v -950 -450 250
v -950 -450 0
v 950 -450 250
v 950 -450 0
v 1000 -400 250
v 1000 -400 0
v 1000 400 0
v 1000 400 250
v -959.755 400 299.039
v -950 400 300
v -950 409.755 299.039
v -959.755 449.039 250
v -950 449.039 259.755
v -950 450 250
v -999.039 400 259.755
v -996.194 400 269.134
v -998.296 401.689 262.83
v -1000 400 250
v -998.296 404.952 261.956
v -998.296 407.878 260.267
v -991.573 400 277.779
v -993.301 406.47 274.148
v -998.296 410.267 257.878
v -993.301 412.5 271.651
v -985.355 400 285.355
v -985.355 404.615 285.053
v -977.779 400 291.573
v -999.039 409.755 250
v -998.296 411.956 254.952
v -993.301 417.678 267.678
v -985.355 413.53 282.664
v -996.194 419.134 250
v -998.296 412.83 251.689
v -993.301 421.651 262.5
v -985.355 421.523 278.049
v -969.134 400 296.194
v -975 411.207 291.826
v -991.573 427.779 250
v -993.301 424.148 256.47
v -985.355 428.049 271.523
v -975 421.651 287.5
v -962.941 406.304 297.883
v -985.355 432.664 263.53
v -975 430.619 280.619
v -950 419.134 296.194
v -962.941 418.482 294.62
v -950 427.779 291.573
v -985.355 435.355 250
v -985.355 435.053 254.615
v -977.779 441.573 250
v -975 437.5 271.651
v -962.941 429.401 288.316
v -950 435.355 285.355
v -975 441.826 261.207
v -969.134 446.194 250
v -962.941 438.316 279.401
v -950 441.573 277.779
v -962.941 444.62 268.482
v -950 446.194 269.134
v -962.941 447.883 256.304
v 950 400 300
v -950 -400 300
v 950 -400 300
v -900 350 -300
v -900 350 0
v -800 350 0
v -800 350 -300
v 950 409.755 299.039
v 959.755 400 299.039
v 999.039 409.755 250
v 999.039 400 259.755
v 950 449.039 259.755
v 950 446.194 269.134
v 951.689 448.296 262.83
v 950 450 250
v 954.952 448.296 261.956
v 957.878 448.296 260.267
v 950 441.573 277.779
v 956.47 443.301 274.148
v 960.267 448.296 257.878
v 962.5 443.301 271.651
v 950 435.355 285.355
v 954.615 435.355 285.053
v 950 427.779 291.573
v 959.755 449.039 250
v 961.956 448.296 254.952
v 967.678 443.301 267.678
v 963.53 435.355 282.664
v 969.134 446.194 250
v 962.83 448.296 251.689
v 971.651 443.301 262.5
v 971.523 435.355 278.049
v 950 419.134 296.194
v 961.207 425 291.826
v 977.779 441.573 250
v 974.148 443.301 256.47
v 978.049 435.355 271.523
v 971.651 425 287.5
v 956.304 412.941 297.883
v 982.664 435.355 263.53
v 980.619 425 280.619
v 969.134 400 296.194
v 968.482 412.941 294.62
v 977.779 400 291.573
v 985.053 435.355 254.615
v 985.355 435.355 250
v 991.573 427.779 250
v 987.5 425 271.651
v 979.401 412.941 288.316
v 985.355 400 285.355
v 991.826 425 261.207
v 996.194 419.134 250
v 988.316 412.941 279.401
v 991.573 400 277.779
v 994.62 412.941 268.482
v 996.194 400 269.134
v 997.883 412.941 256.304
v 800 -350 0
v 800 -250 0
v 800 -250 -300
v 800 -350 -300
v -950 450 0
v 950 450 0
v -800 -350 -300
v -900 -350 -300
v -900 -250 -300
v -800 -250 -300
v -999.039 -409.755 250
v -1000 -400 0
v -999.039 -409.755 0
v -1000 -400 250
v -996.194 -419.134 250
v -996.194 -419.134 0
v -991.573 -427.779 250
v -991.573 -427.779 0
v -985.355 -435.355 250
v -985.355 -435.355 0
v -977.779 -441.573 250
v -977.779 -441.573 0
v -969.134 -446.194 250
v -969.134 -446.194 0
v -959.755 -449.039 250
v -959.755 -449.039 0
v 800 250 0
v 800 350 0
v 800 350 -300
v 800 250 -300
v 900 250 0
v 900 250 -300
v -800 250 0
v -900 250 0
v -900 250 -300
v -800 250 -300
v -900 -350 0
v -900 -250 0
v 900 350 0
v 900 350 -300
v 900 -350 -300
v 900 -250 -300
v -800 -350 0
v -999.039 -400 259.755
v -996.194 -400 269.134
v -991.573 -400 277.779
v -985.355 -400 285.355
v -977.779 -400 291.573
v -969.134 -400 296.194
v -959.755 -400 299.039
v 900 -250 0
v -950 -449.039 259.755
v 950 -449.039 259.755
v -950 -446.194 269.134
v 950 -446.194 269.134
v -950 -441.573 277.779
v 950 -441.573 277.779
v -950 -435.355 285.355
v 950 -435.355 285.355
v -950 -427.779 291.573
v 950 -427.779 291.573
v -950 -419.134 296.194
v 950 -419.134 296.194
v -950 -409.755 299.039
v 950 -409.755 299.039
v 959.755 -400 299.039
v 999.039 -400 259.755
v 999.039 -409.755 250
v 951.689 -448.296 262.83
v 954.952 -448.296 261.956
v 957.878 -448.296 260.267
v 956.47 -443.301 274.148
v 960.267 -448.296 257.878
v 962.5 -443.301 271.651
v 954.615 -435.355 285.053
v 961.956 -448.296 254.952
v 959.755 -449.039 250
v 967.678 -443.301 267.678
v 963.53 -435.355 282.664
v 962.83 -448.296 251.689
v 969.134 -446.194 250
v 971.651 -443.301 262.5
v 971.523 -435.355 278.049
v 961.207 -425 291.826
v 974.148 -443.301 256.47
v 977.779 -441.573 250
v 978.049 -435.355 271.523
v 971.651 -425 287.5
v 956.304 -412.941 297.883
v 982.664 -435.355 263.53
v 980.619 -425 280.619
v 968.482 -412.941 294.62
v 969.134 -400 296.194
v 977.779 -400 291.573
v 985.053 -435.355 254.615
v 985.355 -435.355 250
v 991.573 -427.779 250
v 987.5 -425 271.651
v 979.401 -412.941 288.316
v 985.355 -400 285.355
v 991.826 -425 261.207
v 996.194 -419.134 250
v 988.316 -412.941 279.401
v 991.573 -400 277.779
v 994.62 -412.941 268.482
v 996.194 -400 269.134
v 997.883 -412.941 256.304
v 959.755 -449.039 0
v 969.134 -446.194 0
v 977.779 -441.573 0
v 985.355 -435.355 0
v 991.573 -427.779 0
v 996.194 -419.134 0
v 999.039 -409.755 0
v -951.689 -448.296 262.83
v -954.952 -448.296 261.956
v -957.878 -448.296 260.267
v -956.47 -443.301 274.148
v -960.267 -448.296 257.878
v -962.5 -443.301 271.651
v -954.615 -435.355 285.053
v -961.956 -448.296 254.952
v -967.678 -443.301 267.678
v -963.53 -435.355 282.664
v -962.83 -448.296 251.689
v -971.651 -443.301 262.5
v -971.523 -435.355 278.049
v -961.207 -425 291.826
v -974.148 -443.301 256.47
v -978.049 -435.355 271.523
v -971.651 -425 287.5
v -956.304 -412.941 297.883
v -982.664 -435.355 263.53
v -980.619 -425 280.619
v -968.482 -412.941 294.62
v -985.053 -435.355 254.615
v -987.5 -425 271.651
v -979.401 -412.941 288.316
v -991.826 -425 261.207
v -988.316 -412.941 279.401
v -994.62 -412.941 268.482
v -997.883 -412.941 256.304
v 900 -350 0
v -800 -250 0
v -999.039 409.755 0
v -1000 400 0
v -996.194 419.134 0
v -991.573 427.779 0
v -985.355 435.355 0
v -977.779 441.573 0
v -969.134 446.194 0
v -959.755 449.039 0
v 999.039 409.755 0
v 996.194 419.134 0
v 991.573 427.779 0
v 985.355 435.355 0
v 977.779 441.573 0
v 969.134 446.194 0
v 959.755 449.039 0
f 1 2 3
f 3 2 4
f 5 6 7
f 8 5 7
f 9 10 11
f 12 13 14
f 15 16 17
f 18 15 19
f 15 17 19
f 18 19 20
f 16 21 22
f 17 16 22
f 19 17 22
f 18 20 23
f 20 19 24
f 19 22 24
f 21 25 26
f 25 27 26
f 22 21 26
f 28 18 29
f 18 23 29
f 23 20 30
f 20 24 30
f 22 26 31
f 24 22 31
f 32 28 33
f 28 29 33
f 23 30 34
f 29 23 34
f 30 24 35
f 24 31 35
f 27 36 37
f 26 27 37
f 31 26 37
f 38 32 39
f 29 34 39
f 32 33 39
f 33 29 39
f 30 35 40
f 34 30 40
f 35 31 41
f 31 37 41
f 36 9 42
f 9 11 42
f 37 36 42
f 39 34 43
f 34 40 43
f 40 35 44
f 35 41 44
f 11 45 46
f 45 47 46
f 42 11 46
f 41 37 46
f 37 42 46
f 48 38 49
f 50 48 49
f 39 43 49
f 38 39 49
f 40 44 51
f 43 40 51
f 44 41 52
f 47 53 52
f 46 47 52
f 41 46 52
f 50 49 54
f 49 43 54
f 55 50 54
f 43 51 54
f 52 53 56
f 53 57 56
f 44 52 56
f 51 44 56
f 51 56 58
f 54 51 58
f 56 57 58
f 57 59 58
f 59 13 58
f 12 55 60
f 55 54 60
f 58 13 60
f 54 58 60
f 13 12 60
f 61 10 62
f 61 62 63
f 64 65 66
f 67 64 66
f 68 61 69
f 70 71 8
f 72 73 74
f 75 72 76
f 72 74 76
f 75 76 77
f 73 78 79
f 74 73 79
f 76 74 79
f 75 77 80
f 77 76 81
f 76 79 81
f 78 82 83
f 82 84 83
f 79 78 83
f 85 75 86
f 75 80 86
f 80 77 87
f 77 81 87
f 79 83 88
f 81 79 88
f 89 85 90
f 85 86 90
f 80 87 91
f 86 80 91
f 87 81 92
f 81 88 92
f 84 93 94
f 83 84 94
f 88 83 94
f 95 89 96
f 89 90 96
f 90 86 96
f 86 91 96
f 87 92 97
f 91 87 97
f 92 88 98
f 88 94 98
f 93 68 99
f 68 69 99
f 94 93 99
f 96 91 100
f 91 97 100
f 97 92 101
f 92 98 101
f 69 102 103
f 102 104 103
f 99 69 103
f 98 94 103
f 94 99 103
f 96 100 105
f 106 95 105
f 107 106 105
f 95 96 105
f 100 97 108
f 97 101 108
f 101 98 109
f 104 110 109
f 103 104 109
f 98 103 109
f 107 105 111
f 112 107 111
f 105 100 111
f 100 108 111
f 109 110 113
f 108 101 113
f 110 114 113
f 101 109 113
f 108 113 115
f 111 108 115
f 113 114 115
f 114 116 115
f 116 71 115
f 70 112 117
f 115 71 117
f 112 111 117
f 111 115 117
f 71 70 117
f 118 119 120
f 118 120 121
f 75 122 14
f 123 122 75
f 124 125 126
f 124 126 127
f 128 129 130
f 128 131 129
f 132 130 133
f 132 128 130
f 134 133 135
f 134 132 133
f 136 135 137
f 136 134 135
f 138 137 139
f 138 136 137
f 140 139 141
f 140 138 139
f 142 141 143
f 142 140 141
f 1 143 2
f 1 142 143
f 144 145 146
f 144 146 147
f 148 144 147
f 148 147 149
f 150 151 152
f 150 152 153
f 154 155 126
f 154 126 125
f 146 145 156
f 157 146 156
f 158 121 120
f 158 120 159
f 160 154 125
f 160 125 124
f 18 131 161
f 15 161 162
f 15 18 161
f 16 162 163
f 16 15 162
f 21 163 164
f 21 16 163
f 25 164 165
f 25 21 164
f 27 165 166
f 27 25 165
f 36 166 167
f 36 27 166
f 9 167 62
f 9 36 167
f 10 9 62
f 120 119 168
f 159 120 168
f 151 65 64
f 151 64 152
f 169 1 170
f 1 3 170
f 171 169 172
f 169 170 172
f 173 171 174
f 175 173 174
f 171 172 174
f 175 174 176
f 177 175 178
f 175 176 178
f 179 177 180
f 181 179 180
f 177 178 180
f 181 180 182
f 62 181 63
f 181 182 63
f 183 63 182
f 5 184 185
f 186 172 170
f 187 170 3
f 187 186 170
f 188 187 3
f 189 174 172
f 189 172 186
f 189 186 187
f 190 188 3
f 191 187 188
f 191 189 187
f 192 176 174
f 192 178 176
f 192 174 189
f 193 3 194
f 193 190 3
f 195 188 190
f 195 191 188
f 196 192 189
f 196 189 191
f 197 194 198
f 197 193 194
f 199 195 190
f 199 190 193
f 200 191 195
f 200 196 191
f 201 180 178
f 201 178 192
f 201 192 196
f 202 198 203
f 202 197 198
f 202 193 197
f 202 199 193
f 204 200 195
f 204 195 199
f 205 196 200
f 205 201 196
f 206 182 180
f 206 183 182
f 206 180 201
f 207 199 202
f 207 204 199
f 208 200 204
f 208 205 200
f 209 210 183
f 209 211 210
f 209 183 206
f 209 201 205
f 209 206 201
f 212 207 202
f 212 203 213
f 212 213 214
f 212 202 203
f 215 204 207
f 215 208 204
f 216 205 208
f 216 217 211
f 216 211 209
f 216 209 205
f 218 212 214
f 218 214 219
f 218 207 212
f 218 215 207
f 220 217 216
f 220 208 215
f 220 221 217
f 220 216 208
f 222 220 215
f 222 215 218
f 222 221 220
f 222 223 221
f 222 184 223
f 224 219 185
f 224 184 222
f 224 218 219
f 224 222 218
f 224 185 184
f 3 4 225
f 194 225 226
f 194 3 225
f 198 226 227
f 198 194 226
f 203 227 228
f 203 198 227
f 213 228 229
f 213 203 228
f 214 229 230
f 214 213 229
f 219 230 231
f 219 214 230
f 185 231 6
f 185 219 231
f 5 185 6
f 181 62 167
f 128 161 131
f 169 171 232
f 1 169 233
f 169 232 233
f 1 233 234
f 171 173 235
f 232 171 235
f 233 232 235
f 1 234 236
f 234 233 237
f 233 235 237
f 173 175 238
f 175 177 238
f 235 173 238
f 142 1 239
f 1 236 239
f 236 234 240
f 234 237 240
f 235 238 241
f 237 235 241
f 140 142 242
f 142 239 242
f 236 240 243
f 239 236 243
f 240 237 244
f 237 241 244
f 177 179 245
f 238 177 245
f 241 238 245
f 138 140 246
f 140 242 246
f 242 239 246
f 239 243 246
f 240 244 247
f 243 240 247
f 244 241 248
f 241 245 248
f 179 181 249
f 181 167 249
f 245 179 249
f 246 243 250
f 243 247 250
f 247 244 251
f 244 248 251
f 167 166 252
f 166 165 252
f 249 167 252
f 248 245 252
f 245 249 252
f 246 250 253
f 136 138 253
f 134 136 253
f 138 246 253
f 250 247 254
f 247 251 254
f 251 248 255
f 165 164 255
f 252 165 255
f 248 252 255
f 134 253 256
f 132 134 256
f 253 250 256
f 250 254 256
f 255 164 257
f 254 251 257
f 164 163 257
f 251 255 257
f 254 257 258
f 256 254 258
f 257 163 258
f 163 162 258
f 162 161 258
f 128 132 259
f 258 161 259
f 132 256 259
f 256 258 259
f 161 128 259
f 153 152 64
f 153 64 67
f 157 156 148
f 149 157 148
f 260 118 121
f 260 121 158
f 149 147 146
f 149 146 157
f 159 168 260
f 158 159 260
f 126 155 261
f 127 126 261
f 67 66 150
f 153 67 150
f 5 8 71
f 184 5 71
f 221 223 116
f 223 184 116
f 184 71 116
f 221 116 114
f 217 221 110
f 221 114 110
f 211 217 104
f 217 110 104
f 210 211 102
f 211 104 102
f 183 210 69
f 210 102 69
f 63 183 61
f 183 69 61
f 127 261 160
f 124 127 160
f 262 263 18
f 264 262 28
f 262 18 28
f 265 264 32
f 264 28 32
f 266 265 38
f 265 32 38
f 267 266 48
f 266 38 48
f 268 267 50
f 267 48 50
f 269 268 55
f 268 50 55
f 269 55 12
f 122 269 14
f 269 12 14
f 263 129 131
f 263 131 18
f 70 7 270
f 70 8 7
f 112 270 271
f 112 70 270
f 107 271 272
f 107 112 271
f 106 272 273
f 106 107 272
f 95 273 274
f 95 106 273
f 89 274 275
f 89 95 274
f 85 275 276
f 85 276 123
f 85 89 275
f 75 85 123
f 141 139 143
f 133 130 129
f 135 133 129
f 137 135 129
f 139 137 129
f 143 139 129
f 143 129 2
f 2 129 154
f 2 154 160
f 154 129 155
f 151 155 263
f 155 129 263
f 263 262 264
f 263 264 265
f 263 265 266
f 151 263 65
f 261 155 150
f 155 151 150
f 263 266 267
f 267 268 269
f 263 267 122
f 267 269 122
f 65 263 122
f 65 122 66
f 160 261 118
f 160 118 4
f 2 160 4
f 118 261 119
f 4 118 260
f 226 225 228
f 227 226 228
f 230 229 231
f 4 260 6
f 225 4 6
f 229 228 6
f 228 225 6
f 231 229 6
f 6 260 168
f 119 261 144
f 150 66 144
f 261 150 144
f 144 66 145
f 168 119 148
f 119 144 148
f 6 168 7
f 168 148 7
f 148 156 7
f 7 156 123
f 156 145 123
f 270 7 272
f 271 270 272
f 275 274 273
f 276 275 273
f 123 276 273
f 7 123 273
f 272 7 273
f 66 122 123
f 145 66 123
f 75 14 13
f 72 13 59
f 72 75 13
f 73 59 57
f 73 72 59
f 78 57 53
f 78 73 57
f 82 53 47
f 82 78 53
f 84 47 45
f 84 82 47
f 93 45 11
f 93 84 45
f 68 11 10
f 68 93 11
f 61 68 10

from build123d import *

# Parameters (mm, degrees)
F0_W     = 2000
F0_H     = 900
F1_DEPTH = 300
F2_R     = 50
F3_W     = 100
F3_H     = 100
F4_DEPTH = 300


with BuildPart() as f1:
    # F0 (on Top) → F1 (new body)
    with BuildSketch(Plane.XY):
        Rectangle(F0_W, F0_H)
    extrude(amount=F1_DEPTH)

    # F2
    f2_edges = [f1.edges().sort_by_distance(p)[0] for p in [
        (1000, 0, 300),
        (0, 450, 300),
        (-1000, 0, 300),
        (0, -450, 300),
        (-1000, -450, 150),
        (1000, -450, 150),
        (1000, 450, 150),
        (-1000, 450, 150),
    ]]
    fillet(f2_edges, radius=F2_R)

    # F3 (on face) → F4 (join)
    with BuildSketch(Plane(origin=(0, 0, 0), x_dir=(1, 0, 0), z_dir=(0, 0, -1))):
        with Locations((-850, 300)):
            Rectangle(F3_W, F3_H)
        with Locations((850, 300)):
            Rectangle(F3_W, F3_H)
        with Locations((-850, -300)):
            Rectangle(F3_W, F3_H)
        with Locations((850, -300)):
            Rectangle(F3_W, F3_H)
    extrude(amount=F4_DEPTH)


solid = f1.part
